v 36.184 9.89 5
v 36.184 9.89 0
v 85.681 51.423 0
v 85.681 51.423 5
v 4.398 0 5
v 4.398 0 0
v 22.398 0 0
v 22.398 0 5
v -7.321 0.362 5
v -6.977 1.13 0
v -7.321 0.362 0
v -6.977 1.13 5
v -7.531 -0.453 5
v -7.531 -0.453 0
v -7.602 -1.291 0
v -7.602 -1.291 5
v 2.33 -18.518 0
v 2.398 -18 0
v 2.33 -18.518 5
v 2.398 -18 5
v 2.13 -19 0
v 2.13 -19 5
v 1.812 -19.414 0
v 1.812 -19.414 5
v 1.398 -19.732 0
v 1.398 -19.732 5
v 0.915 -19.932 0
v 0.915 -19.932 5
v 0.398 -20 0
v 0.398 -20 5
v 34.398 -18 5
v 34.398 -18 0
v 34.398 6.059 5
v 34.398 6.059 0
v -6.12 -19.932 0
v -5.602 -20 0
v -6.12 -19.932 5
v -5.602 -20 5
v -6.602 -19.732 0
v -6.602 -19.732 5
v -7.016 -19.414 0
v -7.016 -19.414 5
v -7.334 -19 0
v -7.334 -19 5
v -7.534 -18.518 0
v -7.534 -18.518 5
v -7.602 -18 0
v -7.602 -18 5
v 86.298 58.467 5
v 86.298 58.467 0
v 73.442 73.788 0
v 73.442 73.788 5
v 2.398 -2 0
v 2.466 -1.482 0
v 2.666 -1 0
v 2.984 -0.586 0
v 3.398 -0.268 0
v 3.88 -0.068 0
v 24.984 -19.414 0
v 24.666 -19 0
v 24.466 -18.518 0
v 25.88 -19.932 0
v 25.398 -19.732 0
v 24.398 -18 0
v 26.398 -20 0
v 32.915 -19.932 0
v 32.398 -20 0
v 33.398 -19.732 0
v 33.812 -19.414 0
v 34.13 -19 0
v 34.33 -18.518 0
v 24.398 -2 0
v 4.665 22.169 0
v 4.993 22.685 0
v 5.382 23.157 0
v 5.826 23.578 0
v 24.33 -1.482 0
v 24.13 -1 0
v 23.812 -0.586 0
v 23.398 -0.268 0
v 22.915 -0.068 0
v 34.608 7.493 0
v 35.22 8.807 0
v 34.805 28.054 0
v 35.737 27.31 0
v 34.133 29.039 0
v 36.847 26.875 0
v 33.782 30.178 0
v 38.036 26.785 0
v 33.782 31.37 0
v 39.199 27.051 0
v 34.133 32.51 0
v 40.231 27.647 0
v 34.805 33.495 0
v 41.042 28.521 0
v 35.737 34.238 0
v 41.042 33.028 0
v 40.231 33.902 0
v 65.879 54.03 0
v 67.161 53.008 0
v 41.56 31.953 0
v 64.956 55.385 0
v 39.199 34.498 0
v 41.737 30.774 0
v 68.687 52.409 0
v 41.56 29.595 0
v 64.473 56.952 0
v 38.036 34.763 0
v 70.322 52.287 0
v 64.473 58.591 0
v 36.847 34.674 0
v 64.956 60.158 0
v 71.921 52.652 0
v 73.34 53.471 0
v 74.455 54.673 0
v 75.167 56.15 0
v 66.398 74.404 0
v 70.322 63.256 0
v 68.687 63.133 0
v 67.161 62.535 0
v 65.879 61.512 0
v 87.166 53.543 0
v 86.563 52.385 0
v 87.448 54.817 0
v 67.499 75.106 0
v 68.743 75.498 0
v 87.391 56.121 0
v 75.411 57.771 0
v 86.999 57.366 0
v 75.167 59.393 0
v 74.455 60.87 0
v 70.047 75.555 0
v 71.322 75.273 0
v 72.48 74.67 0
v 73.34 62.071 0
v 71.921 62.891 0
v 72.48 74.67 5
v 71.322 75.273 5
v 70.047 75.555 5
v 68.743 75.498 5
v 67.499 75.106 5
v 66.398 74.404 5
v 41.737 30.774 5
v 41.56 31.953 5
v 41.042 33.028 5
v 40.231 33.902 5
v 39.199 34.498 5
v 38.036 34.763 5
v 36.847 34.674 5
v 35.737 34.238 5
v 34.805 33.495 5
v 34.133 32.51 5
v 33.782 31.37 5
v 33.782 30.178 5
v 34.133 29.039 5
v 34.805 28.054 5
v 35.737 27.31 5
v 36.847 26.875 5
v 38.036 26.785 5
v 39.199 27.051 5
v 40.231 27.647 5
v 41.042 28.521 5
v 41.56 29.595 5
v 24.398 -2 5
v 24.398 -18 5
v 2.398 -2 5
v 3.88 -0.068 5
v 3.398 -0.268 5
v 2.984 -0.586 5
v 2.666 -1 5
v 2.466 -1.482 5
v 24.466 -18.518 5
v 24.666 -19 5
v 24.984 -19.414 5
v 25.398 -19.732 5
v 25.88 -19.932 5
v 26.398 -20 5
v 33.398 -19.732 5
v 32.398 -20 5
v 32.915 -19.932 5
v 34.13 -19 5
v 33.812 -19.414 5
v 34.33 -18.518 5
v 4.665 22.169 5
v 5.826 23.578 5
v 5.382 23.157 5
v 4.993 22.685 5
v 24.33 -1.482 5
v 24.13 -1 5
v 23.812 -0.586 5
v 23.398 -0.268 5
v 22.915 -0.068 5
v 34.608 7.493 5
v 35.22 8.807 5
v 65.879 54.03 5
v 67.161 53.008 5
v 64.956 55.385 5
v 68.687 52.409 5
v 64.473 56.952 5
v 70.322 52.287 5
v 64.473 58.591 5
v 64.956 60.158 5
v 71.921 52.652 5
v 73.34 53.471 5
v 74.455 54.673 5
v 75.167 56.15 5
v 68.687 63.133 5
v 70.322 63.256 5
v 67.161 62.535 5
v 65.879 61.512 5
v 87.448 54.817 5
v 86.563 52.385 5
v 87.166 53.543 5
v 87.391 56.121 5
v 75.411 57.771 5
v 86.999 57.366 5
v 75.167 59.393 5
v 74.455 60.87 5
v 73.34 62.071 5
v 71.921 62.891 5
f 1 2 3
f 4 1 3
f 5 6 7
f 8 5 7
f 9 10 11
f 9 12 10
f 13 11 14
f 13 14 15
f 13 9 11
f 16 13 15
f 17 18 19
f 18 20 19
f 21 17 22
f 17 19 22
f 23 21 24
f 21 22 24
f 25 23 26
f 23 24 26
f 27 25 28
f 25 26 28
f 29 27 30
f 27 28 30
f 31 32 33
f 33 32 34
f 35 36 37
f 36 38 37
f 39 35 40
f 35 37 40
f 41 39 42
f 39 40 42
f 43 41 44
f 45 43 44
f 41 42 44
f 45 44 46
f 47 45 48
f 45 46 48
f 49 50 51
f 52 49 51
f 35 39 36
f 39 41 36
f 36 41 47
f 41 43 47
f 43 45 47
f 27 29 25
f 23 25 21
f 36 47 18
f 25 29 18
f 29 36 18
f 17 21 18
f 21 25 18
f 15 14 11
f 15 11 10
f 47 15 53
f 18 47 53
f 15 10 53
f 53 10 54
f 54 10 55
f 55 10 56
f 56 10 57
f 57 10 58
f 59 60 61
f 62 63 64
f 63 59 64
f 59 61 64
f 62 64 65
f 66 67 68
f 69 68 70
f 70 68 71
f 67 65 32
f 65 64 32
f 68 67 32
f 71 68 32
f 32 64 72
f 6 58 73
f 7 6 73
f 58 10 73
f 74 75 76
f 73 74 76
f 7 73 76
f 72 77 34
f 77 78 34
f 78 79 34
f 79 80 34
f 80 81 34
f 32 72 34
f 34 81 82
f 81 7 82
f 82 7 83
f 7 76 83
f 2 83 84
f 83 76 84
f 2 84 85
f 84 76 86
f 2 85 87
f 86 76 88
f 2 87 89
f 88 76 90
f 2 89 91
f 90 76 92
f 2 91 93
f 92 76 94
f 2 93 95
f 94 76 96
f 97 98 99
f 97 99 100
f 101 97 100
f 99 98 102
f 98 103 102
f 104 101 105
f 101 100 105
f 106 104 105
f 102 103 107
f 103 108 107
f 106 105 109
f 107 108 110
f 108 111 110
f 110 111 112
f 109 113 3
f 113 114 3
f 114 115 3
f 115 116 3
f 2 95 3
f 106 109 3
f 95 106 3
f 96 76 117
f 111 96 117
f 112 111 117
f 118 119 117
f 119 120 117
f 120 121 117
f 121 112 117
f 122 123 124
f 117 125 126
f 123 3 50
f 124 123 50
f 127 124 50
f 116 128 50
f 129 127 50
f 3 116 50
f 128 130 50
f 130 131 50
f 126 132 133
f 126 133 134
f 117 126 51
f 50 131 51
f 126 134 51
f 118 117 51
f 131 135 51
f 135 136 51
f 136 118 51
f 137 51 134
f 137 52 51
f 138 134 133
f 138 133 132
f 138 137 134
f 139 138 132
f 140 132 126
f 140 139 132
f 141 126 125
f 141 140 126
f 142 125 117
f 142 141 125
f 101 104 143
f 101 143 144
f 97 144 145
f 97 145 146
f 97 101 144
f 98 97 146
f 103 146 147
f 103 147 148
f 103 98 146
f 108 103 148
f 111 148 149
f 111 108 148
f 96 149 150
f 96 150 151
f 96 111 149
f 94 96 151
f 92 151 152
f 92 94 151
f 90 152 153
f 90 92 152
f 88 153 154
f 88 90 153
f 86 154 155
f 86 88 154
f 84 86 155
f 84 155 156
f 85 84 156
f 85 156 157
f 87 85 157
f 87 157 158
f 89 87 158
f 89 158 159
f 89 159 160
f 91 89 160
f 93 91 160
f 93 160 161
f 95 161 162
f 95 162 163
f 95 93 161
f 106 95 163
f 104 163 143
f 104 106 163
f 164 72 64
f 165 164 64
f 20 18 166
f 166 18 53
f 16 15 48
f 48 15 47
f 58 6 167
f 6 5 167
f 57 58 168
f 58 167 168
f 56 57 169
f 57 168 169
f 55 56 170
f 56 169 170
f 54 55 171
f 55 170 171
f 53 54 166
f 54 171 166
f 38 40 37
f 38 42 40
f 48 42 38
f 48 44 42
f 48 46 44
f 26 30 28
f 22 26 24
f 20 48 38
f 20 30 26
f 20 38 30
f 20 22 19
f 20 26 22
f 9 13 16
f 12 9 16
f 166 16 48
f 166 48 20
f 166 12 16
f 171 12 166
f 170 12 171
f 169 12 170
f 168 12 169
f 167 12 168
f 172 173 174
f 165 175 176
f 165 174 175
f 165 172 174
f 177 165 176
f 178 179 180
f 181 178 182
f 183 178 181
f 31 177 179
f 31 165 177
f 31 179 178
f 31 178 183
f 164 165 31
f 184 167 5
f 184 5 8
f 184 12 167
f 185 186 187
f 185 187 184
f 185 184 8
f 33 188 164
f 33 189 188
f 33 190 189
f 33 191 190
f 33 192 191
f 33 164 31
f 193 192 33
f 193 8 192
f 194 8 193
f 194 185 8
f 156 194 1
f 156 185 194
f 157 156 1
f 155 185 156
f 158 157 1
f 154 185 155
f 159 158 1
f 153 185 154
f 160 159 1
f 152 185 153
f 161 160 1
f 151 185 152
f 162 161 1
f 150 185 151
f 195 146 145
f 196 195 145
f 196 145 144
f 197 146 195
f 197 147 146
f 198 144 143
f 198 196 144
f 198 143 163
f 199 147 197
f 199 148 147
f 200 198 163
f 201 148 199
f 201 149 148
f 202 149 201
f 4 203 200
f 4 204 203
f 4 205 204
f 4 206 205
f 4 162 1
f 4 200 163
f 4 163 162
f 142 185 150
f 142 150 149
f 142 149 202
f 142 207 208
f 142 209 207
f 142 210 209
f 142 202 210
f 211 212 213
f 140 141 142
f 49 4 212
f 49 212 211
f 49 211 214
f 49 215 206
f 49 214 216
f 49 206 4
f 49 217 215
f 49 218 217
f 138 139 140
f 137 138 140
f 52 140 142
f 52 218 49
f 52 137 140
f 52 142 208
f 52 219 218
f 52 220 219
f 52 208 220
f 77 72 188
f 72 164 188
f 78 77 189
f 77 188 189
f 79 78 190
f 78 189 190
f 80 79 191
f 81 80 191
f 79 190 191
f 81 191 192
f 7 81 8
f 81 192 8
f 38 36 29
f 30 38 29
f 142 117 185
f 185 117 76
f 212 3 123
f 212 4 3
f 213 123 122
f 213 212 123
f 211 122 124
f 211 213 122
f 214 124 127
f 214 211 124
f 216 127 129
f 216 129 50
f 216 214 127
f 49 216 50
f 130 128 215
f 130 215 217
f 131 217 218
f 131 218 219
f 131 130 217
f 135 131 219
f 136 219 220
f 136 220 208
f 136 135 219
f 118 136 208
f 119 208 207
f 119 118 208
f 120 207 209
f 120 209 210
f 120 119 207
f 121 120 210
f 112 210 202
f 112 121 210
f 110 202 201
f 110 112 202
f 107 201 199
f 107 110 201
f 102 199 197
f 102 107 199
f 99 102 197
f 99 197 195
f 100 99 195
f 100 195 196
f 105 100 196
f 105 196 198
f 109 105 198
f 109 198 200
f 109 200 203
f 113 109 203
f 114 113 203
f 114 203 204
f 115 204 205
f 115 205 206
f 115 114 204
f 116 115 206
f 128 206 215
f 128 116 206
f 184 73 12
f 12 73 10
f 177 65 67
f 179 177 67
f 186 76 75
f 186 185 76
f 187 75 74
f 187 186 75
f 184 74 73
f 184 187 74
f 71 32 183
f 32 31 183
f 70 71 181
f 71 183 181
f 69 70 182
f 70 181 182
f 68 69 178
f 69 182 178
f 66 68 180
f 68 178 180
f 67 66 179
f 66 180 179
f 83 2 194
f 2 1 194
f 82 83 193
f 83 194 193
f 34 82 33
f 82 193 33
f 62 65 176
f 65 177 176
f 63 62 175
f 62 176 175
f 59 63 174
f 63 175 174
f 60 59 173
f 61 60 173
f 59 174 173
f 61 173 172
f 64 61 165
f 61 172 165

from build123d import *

# Parameters (mm, degrees)
ESQUISSE1_R        = 5.5
ESQUISSE1_R_2      = 4
BOSS_EXTRU_1_DEPTH = 5
CONG_1_R           = 5
CONG_2_R           = 2


with BuildPart() as part:
    # Esquisse1 → Boss.-Extru.1 (new body)
    with BuildSketch(Plane.XY):
        Polygon((34.397799289, 8.390996312), (89.511576954, 54.636946823), (70.227948663, 77.618280117), (5.114170998, 22.981333294), (-7.602200711, 0), (-7.602200711, -20), (2.397799289, -20), (2.397799289, 0), (24.397799289, 0), (24.397799289, -20), (34.397799289, -20), align=None)
        with Locations((69.911185048, 57.771374544)):
            Circle(ESQUISSE1_R, mode=Mode.SUBTRACT)
        with Locations((37.737318437, 30.774294937)):
            Circle(ESQUISSE1_R_2, mode=Mode.SUBTRACT)
    extrude(amount=BOSS_EXTRU_1_DEPTH)

    # Congé1
    cong_1_edges = [part.edges().sort_by_distance(p)[0] for p in [
        (-7.602200711, 0, 2.5),
        (5.114170998, 22.981333294, 2.5),
        (70.227948663, 77.618280117, 2.5),
        (89.511576954, 54.636946823, 2.5),
        (34.397799289, 8.390996312, 2.5),
    ]]
    fillet(cong_1_edges, radius=CONG_1_R)

    # Congé2
    cong_2_edges = [part.edges().sort_by_distance(p)[0] for p in [
        (2.397799289, 0, 2.5),
        (2.397799289, -20, 2.5),
        (-7.602200711, -20, 2.5),
        (34.397799289, -20, 2.5),
        (24.397799289, -20, 2.5),
        (24.397799289, 0, 2.5),
    ]]
    fillet(cong_2_edges, radius=CONG_2_R)


solid = part.part
